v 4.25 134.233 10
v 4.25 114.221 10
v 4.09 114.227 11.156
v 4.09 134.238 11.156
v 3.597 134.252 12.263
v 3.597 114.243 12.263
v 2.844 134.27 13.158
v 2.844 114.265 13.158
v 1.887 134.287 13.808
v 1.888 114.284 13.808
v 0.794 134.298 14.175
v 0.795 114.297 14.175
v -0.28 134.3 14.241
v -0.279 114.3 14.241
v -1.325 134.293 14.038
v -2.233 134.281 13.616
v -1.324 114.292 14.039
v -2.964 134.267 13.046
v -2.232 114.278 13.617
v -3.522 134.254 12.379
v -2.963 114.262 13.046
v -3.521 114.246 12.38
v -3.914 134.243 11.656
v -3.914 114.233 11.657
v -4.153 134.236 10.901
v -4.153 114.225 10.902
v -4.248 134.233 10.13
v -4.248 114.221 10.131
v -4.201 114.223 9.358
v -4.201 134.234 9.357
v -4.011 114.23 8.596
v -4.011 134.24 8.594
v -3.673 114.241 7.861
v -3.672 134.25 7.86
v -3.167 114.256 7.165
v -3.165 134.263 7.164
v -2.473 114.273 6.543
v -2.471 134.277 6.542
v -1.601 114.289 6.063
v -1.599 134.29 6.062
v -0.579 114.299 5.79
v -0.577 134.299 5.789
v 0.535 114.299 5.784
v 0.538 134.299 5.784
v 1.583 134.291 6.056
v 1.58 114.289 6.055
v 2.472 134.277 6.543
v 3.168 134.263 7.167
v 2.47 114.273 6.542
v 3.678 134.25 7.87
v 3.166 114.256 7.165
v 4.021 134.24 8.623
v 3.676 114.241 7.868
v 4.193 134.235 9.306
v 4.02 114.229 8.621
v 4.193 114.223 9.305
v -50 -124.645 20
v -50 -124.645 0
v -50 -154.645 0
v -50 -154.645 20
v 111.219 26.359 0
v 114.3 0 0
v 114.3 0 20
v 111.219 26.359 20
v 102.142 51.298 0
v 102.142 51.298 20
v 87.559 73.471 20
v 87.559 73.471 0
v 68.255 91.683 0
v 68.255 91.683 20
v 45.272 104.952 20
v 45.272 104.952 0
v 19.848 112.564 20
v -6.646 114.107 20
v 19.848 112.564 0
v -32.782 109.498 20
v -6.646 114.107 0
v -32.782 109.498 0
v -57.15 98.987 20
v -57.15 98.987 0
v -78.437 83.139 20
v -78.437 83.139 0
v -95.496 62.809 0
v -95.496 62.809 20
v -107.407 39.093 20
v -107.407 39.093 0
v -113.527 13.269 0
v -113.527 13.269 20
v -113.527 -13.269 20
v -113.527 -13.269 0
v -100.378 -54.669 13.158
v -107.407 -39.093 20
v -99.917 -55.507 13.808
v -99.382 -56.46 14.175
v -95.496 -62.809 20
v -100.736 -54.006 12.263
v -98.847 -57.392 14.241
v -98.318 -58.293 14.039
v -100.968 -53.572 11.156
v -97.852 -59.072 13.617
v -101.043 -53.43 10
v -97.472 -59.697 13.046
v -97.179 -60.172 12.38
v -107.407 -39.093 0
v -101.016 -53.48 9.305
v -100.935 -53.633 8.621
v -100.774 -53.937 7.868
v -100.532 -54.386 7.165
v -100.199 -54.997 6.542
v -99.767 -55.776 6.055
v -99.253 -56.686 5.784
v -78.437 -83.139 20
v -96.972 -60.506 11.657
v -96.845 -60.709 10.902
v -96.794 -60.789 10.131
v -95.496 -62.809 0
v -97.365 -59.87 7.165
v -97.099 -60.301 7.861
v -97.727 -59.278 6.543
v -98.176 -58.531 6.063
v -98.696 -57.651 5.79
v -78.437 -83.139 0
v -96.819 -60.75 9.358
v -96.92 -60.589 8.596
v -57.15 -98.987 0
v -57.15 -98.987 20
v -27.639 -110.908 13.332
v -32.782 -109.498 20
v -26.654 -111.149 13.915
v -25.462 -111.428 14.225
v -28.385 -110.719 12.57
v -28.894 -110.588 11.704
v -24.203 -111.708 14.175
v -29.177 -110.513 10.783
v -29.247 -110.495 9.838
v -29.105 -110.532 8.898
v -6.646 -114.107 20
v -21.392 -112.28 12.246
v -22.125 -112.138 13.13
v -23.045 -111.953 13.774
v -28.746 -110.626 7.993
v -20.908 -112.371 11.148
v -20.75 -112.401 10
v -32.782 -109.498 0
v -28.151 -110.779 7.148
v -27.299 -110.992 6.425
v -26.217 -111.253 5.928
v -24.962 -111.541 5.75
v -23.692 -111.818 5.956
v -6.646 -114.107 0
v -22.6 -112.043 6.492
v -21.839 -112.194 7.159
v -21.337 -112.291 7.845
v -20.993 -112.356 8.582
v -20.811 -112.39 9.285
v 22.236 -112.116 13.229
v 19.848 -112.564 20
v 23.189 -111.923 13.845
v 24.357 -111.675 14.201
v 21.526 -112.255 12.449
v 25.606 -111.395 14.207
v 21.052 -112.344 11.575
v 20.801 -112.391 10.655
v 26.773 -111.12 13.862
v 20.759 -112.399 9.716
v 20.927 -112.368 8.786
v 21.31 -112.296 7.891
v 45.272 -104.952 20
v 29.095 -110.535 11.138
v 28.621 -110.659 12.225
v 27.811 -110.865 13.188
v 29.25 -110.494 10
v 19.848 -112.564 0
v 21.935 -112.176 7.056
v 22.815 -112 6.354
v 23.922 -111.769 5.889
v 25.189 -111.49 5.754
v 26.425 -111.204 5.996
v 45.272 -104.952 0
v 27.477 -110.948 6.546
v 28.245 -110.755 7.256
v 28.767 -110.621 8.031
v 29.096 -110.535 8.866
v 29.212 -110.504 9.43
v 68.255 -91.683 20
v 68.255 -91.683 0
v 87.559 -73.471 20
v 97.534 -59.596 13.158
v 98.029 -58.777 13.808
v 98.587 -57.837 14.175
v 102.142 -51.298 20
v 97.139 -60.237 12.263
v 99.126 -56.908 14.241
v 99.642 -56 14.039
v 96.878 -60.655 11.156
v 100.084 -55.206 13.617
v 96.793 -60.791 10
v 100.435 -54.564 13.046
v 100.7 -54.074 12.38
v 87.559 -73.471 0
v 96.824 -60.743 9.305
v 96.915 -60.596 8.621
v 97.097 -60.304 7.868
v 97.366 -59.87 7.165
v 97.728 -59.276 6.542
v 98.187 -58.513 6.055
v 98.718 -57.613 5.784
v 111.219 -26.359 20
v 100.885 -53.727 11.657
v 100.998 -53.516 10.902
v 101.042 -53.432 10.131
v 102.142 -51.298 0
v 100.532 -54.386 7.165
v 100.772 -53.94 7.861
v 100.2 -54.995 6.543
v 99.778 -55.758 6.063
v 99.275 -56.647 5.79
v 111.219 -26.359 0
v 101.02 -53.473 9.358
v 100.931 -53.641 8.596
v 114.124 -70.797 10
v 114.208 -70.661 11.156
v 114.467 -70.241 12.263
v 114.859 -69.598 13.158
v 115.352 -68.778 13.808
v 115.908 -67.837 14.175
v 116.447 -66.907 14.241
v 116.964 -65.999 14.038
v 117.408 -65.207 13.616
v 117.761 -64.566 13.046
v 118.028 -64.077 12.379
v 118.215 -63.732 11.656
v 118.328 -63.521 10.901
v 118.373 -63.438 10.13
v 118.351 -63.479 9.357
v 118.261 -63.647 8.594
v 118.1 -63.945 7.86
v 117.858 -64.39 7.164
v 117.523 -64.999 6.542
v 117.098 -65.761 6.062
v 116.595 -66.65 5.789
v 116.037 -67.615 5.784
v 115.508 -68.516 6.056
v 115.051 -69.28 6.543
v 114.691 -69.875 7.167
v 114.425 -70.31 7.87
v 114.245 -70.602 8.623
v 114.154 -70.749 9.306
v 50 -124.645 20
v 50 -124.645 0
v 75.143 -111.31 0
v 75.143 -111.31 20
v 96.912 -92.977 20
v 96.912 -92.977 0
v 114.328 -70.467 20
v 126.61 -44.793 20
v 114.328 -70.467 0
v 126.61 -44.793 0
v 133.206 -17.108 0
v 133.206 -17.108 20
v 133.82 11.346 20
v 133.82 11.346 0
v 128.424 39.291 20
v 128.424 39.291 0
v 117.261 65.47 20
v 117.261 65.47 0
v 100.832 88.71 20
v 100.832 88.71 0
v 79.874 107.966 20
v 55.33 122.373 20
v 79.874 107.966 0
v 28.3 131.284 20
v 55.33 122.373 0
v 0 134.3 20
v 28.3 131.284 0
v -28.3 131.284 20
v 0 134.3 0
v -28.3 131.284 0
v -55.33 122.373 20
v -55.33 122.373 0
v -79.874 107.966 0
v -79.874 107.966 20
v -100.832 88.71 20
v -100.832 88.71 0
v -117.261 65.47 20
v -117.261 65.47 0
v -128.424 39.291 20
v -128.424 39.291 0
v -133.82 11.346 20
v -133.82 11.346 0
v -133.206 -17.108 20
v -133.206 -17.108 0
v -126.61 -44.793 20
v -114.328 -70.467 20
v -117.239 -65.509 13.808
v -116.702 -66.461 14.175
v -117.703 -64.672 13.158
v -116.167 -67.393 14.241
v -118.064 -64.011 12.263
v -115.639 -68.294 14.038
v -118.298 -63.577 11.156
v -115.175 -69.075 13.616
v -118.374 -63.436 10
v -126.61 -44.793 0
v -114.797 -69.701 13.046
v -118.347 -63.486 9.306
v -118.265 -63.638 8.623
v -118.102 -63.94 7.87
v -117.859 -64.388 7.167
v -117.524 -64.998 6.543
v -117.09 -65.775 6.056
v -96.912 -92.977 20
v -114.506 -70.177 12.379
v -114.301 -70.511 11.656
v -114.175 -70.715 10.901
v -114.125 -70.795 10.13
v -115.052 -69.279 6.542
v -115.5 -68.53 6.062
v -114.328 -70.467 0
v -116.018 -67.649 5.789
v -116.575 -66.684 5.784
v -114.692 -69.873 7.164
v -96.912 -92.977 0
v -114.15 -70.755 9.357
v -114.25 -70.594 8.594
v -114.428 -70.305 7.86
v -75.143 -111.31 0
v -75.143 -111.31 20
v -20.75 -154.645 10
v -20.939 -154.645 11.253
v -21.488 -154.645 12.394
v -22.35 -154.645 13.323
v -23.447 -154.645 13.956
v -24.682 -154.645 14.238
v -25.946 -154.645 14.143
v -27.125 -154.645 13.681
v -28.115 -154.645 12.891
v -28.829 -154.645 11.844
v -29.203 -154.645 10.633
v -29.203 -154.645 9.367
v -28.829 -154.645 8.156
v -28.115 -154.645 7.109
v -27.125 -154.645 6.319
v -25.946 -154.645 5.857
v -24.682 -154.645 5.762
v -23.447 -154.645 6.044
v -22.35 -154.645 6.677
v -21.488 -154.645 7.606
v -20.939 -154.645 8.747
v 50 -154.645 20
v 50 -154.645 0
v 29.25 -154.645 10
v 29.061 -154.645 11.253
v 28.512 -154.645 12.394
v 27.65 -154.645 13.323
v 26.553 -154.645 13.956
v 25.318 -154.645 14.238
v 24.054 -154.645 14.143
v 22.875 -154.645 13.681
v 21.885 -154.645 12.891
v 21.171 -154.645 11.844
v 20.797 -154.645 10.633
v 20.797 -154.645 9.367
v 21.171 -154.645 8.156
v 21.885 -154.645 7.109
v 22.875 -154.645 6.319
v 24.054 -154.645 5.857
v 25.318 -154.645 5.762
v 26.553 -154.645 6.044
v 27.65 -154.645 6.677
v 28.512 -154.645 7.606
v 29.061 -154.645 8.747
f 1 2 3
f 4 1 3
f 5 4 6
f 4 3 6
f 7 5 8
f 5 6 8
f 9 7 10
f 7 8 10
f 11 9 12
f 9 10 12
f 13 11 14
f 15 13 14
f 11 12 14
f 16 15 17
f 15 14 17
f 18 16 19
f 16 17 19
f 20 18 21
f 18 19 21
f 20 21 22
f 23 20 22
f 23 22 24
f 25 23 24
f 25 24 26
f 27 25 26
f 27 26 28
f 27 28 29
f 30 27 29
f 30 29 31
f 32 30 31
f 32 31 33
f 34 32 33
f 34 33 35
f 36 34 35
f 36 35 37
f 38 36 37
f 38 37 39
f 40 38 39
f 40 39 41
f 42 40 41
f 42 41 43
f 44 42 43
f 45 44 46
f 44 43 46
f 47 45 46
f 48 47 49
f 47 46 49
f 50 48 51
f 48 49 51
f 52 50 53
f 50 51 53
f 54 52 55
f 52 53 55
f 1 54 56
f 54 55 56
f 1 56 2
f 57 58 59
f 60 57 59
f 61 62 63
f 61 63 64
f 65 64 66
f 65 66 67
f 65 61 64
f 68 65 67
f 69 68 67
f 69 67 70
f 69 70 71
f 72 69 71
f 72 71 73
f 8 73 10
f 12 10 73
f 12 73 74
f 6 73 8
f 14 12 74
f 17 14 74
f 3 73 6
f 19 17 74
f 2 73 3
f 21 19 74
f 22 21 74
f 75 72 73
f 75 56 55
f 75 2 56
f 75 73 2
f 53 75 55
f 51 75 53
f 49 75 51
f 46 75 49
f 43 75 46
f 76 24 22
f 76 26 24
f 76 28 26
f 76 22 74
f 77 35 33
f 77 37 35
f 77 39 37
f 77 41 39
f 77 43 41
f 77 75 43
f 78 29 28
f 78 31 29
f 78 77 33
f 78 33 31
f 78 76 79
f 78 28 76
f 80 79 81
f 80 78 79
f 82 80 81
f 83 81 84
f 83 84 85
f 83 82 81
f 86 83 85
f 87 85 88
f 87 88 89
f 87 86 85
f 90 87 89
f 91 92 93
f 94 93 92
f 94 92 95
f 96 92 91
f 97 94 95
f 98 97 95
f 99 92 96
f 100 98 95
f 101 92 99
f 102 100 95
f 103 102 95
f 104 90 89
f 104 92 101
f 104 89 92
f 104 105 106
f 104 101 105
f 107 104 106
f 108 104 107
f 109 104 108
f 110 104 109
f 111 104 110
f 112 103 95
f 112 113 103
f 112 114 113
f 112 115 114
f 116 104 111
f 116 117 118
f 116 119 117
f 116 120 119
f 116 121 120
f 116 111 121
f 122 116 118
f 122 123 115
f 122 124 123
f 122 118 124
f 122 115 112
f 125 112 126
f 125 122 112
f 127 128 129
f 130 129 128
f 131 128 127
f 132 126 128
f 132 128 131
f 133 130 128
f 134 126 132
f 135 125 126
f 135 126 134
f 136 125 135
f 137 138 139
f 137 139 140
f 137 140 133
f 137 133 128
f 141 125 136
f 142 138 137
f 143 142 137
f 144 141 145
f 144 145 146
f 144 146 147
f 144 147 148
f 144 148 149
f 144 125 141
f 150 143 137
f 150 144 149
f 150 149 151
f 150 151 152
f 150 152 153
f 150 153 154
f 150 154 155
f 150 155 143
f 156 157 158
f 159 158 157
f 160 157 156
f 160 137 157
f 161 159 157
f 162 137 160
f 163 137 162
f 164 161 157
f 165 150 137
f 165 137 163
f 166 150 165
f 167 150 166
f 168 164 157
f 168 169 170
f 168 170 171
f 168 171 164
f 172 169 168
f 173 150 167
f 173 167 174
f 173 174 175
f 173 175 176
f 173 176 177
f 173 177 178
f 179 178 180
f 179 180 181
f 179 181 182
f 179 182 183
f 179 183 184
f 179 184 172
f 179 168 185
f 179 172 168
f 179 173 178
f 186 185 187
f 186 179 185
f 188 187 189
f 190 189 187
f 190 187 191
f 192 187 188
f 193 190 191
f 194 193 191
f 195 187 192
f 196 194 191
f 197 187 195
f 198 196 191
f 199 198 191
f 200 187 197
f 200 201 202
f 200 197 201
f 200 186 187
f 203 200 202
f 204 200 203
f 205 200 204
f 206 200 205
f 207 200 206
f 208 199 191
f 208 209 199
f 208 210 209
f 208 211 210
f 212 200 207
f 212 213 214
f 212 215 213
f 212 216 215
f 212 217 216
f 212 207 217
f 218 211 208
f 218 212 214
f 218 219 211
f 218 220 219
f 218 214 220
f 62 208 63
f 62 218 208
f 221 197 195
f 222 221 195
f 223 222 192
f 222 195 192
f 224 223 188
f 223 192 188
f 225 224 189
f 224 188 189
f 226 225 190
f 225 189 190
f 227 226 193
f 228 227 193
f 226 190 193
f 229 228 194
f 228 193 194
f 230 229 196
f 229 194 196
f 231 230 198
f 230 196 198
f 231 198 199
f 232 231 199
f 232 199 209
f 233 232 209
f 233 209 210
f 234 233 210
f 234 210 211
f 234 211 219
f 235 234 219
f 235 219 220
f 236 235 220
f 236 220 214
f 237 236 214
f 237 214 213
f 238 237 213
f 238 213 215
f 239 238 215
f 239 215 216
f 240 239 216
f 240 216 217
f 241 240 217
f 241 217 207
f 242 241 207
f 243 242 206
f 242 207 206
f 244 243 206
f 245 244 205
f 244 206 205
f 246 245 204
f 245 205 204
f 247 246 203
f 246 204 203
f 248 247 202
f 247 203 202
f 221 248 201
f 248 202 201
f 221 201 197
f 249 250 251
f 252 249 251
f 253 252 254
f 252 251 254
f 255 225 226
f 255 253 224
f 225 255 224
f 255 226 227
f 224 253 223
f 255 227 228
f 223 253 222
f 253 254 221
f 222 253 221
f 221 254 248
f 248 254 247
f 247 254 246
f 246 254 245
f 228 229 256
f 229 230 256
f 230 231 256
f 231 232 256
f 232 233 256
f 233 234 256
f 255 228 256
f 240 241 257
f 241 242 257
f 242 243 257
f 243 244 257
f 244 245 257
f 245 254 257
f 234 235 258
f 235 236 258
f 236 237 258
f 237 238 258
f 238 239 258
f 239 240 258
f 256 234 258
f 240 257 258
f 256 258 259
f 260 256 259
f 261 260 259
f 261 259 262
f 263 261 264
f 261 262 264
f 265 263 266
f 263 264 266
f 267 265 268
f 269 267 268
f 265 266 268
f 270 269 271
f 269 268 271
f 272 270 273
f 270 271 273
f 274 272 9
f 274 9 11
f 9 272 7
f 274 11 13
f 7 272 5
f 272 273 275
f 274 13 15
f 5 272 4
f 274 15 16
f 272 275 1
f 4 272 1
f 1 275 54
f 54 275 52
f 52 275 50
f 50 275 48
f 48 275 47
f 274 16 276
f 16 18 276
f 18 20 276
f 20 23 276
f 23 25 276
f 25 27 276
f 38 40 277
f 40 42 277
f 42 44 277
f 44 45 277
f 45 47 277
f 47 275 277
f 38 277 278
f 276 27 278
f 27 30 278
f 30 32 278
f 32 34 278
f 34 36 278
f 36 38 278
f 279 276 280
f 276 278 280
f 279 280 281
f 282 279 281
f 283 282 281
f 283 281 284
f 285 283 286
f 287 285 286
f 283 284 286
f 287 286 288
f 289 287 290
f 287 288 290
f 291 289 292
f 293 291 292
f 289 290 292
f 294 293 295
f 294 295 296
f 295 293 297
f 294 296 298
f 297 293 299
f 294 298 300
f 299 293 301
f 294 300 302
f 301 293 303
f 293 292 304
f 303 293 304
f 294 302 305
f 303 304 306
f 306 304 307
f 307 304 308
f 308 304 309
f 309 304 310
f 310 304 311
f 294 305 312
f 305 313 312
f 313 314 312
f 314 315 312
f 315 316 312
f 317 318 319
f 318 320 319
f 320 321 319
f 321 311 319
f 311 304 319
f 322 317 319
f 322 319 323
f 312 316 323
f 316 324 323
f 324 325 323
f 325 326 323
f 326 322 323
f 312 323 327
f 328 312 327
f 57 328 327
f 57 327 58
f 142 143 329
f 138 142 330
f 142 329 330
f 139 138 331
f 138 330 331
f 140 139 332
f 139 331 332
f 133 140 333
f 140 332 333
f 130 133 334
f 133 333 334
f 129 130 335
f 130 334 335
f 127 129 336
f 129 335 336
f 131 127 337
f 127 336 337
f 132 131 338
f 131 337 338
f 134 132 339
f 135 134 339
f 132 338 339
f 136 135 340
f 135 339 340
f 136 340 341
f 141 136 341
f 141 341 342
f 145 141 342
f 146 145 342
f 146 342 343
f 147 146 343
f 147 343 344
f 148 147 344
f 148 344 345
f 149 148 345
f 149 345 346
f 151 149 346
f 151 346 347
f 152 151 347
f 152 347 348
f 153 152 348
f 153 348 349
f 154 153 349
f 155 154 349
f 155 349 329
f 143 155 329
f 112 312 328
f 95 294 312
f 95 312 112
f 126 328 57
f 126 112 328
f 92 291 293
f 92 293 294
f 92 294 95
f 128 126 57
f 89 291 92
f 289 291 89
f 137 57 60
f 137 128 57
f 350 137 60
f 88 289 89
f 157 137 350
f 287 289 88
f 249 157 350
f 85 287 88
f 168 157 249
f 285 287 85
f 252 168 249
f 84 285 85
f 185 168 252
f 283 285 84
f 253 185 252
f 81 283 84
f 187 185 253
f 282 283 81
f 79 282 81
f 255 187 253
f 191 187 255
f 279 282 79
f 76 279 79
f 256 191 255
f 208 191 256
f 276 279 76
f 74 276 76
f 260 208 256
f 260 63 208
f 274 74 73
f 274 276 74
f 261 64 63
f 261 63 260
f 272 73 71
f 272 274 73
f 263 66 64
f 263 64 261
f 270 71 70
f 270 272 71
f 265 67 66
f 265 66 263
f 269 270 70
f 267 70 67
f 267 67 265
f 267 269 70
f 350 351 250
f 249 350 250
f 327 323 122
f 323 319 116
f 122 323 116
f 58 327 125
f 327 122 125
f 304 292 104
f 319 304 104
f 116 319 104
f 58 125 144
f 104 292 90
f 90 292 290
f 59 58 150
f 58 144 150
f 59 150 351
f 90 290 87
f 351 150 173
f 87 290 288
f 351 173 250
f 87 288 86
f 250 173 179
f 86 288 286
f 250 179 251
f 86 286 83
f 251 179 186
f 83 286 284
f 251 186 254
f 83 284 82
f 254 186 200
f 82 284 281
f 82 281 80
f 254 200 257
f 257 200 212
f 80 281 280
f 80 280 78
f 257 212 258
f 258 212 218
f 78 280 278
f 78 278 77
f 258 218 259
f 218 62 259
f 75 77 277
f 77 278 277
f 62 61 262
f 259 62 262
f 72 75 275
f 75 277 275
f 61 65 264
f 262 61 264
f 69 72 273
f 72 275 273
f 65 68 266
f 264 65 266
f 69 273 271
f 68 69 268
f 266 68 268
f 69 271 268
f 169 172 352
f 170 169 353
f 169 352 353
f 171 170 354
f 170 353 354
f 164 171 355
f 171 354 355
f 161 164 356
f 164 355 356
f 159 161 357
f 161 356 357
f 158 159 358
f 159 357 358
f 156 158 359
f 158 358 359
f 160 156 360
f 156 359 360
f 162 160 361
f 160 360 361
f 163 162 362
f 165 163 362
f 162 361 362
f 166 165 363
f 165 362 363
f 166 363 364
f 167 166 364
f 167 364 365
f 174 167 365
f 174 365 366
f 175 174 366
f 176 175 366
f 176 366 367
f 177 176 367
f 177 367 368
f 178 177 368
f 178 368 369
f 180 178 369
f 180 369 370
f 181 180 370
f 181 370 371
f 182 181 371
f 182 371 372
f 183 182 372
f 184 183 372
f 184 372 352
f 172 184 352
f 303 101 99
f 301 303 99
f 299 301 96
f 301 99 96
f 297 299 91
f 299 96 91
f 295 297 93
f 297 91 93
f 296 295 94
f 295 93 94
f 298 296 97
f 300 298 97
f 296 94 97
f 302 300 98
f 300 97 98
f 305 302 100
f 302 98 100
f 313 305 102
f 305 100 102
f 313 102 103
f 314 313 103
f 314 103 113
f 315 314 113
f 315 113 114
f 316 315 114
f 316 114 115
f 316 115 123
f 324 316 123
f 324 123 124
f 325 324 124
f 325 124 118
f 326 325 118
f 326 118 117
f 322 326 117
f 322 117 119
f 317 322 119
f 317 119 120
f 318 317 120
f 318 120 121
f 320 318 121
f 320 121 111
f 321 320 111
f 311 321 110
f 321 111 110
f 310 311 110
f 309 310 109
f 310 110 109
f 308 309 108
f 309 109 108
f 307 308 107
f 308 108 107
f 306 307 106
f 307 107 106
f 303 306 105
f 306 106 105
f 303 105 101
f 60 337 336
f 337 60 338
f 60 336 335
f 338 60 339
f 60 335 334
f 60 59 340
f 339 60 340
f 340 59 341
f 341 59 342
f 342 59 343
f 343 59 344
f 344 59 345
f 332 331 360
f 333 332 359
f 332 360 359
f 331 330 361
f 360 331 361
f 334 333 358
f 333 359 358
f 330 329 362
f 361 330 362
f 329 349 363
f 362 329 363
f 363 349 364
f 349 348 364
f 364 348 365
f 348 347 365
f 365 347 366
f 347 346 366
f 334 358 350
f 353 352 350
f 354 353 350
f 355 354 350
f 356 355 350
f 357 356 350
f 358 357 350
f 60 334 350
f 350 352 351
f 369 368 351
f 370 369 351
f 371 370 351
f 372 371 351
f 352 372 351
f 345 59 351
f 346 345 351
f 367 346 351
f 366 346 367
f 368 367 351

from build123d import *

# Parameters (mm, degrees)
SKETCH006_R           = 114.3
PAD003_DEPTH          = 20
SKETCH007_R           = 4.25
HOLE001_DEPTH         = 75
HOLE001_TIPS_R        = 4.25
SKETCH008_R           = 4.25
HOLE002_DEPTH         = 200
POLARPATTERN001_COUNT = 3
POLARPATTERN001_ANGLE = 240


with BuildPart() as part:
    # Sketch006 → Pad003 (new body)
    with BuildSketch(Plane.XY):
        with BuildLine():
            ThreePointArc((50, -124.645457), (0, 134.3), (-50, -124.645457))
            Line((-50, -124.645457), (-50, -154.645457))
            Line((-50, -154.645457), (50, -154.645457))
            Line((50, -154.645457), (50, -124.645457))
        make_face()
        Circle(SKETCH006_R, mode=Mode.SUBTRACT)
    extrude(amount=PAD003_DEPTH)

    # Sketch007 (on Face3 of Pad003) → Hole001 (cut)
    with BuildSketch(Plane.XZ.offset(154.645457)):
        with Locations((-25, 10)):
            Circle(SKETCH007_R)
        with Locations((25, 10)):
            Circle(SKETCH007_R)
    extrude(amount=-HOLE001_DEPTH, mode=Mode.SUBTRACT)

    # Hole001 tips → Hole001 tip 1 section 0
    with BuildSketch(Plane.XZ.offset(79.645457), mode=Mode.PRIVATE) as hole001_tip_1_s0:
        with Locations((-25, 10)):
            Circle(HOLE001_TIPS_R)
    loft([hole001_tip_1_s0.sketch, Vertex(-25, -77.0918, 10)], mode=Mode.SUBTRACT)

    # Hole001 tips → Hole001 tip 2 section 0
    with BuildSketch(Plane.XZ.offset(79.645457), mode=Mode.PRIVATE) as hole001_tip_2_s0:
        with Locations((25, 10)):
            Circle(HOLE001_TIPS_R)
    loft([hole001_tip_2_s0.sketch, Vertex(25, -77.0918, 10)], mode=Mode.SUBTRACT)

    # Sketch008 → Hole002 (cut)
    with BuildSketch(Plane.XZ):
        with Locations((0, 10)):
            Circle(SKETCH008_R)
    hole002 = extrude(amount=-HOLE002_DEPTH, mode=Mode.SUBTRACT)

    # PolarPattern001: Hole002 ×3 about axis
    polarpattern001_axis = Axis((0, 0, 0), (0, 0, 1))
    for i in range(1, POLARPATTERN001_COUNT):
        add(hole002.rotate(polarpattern001_axis, i * POLARPATTERN001_ANGLE / (POLARPATTERN001_COUNT - 1)), mode=Mode.SUBTRACT)


solid = part.part
